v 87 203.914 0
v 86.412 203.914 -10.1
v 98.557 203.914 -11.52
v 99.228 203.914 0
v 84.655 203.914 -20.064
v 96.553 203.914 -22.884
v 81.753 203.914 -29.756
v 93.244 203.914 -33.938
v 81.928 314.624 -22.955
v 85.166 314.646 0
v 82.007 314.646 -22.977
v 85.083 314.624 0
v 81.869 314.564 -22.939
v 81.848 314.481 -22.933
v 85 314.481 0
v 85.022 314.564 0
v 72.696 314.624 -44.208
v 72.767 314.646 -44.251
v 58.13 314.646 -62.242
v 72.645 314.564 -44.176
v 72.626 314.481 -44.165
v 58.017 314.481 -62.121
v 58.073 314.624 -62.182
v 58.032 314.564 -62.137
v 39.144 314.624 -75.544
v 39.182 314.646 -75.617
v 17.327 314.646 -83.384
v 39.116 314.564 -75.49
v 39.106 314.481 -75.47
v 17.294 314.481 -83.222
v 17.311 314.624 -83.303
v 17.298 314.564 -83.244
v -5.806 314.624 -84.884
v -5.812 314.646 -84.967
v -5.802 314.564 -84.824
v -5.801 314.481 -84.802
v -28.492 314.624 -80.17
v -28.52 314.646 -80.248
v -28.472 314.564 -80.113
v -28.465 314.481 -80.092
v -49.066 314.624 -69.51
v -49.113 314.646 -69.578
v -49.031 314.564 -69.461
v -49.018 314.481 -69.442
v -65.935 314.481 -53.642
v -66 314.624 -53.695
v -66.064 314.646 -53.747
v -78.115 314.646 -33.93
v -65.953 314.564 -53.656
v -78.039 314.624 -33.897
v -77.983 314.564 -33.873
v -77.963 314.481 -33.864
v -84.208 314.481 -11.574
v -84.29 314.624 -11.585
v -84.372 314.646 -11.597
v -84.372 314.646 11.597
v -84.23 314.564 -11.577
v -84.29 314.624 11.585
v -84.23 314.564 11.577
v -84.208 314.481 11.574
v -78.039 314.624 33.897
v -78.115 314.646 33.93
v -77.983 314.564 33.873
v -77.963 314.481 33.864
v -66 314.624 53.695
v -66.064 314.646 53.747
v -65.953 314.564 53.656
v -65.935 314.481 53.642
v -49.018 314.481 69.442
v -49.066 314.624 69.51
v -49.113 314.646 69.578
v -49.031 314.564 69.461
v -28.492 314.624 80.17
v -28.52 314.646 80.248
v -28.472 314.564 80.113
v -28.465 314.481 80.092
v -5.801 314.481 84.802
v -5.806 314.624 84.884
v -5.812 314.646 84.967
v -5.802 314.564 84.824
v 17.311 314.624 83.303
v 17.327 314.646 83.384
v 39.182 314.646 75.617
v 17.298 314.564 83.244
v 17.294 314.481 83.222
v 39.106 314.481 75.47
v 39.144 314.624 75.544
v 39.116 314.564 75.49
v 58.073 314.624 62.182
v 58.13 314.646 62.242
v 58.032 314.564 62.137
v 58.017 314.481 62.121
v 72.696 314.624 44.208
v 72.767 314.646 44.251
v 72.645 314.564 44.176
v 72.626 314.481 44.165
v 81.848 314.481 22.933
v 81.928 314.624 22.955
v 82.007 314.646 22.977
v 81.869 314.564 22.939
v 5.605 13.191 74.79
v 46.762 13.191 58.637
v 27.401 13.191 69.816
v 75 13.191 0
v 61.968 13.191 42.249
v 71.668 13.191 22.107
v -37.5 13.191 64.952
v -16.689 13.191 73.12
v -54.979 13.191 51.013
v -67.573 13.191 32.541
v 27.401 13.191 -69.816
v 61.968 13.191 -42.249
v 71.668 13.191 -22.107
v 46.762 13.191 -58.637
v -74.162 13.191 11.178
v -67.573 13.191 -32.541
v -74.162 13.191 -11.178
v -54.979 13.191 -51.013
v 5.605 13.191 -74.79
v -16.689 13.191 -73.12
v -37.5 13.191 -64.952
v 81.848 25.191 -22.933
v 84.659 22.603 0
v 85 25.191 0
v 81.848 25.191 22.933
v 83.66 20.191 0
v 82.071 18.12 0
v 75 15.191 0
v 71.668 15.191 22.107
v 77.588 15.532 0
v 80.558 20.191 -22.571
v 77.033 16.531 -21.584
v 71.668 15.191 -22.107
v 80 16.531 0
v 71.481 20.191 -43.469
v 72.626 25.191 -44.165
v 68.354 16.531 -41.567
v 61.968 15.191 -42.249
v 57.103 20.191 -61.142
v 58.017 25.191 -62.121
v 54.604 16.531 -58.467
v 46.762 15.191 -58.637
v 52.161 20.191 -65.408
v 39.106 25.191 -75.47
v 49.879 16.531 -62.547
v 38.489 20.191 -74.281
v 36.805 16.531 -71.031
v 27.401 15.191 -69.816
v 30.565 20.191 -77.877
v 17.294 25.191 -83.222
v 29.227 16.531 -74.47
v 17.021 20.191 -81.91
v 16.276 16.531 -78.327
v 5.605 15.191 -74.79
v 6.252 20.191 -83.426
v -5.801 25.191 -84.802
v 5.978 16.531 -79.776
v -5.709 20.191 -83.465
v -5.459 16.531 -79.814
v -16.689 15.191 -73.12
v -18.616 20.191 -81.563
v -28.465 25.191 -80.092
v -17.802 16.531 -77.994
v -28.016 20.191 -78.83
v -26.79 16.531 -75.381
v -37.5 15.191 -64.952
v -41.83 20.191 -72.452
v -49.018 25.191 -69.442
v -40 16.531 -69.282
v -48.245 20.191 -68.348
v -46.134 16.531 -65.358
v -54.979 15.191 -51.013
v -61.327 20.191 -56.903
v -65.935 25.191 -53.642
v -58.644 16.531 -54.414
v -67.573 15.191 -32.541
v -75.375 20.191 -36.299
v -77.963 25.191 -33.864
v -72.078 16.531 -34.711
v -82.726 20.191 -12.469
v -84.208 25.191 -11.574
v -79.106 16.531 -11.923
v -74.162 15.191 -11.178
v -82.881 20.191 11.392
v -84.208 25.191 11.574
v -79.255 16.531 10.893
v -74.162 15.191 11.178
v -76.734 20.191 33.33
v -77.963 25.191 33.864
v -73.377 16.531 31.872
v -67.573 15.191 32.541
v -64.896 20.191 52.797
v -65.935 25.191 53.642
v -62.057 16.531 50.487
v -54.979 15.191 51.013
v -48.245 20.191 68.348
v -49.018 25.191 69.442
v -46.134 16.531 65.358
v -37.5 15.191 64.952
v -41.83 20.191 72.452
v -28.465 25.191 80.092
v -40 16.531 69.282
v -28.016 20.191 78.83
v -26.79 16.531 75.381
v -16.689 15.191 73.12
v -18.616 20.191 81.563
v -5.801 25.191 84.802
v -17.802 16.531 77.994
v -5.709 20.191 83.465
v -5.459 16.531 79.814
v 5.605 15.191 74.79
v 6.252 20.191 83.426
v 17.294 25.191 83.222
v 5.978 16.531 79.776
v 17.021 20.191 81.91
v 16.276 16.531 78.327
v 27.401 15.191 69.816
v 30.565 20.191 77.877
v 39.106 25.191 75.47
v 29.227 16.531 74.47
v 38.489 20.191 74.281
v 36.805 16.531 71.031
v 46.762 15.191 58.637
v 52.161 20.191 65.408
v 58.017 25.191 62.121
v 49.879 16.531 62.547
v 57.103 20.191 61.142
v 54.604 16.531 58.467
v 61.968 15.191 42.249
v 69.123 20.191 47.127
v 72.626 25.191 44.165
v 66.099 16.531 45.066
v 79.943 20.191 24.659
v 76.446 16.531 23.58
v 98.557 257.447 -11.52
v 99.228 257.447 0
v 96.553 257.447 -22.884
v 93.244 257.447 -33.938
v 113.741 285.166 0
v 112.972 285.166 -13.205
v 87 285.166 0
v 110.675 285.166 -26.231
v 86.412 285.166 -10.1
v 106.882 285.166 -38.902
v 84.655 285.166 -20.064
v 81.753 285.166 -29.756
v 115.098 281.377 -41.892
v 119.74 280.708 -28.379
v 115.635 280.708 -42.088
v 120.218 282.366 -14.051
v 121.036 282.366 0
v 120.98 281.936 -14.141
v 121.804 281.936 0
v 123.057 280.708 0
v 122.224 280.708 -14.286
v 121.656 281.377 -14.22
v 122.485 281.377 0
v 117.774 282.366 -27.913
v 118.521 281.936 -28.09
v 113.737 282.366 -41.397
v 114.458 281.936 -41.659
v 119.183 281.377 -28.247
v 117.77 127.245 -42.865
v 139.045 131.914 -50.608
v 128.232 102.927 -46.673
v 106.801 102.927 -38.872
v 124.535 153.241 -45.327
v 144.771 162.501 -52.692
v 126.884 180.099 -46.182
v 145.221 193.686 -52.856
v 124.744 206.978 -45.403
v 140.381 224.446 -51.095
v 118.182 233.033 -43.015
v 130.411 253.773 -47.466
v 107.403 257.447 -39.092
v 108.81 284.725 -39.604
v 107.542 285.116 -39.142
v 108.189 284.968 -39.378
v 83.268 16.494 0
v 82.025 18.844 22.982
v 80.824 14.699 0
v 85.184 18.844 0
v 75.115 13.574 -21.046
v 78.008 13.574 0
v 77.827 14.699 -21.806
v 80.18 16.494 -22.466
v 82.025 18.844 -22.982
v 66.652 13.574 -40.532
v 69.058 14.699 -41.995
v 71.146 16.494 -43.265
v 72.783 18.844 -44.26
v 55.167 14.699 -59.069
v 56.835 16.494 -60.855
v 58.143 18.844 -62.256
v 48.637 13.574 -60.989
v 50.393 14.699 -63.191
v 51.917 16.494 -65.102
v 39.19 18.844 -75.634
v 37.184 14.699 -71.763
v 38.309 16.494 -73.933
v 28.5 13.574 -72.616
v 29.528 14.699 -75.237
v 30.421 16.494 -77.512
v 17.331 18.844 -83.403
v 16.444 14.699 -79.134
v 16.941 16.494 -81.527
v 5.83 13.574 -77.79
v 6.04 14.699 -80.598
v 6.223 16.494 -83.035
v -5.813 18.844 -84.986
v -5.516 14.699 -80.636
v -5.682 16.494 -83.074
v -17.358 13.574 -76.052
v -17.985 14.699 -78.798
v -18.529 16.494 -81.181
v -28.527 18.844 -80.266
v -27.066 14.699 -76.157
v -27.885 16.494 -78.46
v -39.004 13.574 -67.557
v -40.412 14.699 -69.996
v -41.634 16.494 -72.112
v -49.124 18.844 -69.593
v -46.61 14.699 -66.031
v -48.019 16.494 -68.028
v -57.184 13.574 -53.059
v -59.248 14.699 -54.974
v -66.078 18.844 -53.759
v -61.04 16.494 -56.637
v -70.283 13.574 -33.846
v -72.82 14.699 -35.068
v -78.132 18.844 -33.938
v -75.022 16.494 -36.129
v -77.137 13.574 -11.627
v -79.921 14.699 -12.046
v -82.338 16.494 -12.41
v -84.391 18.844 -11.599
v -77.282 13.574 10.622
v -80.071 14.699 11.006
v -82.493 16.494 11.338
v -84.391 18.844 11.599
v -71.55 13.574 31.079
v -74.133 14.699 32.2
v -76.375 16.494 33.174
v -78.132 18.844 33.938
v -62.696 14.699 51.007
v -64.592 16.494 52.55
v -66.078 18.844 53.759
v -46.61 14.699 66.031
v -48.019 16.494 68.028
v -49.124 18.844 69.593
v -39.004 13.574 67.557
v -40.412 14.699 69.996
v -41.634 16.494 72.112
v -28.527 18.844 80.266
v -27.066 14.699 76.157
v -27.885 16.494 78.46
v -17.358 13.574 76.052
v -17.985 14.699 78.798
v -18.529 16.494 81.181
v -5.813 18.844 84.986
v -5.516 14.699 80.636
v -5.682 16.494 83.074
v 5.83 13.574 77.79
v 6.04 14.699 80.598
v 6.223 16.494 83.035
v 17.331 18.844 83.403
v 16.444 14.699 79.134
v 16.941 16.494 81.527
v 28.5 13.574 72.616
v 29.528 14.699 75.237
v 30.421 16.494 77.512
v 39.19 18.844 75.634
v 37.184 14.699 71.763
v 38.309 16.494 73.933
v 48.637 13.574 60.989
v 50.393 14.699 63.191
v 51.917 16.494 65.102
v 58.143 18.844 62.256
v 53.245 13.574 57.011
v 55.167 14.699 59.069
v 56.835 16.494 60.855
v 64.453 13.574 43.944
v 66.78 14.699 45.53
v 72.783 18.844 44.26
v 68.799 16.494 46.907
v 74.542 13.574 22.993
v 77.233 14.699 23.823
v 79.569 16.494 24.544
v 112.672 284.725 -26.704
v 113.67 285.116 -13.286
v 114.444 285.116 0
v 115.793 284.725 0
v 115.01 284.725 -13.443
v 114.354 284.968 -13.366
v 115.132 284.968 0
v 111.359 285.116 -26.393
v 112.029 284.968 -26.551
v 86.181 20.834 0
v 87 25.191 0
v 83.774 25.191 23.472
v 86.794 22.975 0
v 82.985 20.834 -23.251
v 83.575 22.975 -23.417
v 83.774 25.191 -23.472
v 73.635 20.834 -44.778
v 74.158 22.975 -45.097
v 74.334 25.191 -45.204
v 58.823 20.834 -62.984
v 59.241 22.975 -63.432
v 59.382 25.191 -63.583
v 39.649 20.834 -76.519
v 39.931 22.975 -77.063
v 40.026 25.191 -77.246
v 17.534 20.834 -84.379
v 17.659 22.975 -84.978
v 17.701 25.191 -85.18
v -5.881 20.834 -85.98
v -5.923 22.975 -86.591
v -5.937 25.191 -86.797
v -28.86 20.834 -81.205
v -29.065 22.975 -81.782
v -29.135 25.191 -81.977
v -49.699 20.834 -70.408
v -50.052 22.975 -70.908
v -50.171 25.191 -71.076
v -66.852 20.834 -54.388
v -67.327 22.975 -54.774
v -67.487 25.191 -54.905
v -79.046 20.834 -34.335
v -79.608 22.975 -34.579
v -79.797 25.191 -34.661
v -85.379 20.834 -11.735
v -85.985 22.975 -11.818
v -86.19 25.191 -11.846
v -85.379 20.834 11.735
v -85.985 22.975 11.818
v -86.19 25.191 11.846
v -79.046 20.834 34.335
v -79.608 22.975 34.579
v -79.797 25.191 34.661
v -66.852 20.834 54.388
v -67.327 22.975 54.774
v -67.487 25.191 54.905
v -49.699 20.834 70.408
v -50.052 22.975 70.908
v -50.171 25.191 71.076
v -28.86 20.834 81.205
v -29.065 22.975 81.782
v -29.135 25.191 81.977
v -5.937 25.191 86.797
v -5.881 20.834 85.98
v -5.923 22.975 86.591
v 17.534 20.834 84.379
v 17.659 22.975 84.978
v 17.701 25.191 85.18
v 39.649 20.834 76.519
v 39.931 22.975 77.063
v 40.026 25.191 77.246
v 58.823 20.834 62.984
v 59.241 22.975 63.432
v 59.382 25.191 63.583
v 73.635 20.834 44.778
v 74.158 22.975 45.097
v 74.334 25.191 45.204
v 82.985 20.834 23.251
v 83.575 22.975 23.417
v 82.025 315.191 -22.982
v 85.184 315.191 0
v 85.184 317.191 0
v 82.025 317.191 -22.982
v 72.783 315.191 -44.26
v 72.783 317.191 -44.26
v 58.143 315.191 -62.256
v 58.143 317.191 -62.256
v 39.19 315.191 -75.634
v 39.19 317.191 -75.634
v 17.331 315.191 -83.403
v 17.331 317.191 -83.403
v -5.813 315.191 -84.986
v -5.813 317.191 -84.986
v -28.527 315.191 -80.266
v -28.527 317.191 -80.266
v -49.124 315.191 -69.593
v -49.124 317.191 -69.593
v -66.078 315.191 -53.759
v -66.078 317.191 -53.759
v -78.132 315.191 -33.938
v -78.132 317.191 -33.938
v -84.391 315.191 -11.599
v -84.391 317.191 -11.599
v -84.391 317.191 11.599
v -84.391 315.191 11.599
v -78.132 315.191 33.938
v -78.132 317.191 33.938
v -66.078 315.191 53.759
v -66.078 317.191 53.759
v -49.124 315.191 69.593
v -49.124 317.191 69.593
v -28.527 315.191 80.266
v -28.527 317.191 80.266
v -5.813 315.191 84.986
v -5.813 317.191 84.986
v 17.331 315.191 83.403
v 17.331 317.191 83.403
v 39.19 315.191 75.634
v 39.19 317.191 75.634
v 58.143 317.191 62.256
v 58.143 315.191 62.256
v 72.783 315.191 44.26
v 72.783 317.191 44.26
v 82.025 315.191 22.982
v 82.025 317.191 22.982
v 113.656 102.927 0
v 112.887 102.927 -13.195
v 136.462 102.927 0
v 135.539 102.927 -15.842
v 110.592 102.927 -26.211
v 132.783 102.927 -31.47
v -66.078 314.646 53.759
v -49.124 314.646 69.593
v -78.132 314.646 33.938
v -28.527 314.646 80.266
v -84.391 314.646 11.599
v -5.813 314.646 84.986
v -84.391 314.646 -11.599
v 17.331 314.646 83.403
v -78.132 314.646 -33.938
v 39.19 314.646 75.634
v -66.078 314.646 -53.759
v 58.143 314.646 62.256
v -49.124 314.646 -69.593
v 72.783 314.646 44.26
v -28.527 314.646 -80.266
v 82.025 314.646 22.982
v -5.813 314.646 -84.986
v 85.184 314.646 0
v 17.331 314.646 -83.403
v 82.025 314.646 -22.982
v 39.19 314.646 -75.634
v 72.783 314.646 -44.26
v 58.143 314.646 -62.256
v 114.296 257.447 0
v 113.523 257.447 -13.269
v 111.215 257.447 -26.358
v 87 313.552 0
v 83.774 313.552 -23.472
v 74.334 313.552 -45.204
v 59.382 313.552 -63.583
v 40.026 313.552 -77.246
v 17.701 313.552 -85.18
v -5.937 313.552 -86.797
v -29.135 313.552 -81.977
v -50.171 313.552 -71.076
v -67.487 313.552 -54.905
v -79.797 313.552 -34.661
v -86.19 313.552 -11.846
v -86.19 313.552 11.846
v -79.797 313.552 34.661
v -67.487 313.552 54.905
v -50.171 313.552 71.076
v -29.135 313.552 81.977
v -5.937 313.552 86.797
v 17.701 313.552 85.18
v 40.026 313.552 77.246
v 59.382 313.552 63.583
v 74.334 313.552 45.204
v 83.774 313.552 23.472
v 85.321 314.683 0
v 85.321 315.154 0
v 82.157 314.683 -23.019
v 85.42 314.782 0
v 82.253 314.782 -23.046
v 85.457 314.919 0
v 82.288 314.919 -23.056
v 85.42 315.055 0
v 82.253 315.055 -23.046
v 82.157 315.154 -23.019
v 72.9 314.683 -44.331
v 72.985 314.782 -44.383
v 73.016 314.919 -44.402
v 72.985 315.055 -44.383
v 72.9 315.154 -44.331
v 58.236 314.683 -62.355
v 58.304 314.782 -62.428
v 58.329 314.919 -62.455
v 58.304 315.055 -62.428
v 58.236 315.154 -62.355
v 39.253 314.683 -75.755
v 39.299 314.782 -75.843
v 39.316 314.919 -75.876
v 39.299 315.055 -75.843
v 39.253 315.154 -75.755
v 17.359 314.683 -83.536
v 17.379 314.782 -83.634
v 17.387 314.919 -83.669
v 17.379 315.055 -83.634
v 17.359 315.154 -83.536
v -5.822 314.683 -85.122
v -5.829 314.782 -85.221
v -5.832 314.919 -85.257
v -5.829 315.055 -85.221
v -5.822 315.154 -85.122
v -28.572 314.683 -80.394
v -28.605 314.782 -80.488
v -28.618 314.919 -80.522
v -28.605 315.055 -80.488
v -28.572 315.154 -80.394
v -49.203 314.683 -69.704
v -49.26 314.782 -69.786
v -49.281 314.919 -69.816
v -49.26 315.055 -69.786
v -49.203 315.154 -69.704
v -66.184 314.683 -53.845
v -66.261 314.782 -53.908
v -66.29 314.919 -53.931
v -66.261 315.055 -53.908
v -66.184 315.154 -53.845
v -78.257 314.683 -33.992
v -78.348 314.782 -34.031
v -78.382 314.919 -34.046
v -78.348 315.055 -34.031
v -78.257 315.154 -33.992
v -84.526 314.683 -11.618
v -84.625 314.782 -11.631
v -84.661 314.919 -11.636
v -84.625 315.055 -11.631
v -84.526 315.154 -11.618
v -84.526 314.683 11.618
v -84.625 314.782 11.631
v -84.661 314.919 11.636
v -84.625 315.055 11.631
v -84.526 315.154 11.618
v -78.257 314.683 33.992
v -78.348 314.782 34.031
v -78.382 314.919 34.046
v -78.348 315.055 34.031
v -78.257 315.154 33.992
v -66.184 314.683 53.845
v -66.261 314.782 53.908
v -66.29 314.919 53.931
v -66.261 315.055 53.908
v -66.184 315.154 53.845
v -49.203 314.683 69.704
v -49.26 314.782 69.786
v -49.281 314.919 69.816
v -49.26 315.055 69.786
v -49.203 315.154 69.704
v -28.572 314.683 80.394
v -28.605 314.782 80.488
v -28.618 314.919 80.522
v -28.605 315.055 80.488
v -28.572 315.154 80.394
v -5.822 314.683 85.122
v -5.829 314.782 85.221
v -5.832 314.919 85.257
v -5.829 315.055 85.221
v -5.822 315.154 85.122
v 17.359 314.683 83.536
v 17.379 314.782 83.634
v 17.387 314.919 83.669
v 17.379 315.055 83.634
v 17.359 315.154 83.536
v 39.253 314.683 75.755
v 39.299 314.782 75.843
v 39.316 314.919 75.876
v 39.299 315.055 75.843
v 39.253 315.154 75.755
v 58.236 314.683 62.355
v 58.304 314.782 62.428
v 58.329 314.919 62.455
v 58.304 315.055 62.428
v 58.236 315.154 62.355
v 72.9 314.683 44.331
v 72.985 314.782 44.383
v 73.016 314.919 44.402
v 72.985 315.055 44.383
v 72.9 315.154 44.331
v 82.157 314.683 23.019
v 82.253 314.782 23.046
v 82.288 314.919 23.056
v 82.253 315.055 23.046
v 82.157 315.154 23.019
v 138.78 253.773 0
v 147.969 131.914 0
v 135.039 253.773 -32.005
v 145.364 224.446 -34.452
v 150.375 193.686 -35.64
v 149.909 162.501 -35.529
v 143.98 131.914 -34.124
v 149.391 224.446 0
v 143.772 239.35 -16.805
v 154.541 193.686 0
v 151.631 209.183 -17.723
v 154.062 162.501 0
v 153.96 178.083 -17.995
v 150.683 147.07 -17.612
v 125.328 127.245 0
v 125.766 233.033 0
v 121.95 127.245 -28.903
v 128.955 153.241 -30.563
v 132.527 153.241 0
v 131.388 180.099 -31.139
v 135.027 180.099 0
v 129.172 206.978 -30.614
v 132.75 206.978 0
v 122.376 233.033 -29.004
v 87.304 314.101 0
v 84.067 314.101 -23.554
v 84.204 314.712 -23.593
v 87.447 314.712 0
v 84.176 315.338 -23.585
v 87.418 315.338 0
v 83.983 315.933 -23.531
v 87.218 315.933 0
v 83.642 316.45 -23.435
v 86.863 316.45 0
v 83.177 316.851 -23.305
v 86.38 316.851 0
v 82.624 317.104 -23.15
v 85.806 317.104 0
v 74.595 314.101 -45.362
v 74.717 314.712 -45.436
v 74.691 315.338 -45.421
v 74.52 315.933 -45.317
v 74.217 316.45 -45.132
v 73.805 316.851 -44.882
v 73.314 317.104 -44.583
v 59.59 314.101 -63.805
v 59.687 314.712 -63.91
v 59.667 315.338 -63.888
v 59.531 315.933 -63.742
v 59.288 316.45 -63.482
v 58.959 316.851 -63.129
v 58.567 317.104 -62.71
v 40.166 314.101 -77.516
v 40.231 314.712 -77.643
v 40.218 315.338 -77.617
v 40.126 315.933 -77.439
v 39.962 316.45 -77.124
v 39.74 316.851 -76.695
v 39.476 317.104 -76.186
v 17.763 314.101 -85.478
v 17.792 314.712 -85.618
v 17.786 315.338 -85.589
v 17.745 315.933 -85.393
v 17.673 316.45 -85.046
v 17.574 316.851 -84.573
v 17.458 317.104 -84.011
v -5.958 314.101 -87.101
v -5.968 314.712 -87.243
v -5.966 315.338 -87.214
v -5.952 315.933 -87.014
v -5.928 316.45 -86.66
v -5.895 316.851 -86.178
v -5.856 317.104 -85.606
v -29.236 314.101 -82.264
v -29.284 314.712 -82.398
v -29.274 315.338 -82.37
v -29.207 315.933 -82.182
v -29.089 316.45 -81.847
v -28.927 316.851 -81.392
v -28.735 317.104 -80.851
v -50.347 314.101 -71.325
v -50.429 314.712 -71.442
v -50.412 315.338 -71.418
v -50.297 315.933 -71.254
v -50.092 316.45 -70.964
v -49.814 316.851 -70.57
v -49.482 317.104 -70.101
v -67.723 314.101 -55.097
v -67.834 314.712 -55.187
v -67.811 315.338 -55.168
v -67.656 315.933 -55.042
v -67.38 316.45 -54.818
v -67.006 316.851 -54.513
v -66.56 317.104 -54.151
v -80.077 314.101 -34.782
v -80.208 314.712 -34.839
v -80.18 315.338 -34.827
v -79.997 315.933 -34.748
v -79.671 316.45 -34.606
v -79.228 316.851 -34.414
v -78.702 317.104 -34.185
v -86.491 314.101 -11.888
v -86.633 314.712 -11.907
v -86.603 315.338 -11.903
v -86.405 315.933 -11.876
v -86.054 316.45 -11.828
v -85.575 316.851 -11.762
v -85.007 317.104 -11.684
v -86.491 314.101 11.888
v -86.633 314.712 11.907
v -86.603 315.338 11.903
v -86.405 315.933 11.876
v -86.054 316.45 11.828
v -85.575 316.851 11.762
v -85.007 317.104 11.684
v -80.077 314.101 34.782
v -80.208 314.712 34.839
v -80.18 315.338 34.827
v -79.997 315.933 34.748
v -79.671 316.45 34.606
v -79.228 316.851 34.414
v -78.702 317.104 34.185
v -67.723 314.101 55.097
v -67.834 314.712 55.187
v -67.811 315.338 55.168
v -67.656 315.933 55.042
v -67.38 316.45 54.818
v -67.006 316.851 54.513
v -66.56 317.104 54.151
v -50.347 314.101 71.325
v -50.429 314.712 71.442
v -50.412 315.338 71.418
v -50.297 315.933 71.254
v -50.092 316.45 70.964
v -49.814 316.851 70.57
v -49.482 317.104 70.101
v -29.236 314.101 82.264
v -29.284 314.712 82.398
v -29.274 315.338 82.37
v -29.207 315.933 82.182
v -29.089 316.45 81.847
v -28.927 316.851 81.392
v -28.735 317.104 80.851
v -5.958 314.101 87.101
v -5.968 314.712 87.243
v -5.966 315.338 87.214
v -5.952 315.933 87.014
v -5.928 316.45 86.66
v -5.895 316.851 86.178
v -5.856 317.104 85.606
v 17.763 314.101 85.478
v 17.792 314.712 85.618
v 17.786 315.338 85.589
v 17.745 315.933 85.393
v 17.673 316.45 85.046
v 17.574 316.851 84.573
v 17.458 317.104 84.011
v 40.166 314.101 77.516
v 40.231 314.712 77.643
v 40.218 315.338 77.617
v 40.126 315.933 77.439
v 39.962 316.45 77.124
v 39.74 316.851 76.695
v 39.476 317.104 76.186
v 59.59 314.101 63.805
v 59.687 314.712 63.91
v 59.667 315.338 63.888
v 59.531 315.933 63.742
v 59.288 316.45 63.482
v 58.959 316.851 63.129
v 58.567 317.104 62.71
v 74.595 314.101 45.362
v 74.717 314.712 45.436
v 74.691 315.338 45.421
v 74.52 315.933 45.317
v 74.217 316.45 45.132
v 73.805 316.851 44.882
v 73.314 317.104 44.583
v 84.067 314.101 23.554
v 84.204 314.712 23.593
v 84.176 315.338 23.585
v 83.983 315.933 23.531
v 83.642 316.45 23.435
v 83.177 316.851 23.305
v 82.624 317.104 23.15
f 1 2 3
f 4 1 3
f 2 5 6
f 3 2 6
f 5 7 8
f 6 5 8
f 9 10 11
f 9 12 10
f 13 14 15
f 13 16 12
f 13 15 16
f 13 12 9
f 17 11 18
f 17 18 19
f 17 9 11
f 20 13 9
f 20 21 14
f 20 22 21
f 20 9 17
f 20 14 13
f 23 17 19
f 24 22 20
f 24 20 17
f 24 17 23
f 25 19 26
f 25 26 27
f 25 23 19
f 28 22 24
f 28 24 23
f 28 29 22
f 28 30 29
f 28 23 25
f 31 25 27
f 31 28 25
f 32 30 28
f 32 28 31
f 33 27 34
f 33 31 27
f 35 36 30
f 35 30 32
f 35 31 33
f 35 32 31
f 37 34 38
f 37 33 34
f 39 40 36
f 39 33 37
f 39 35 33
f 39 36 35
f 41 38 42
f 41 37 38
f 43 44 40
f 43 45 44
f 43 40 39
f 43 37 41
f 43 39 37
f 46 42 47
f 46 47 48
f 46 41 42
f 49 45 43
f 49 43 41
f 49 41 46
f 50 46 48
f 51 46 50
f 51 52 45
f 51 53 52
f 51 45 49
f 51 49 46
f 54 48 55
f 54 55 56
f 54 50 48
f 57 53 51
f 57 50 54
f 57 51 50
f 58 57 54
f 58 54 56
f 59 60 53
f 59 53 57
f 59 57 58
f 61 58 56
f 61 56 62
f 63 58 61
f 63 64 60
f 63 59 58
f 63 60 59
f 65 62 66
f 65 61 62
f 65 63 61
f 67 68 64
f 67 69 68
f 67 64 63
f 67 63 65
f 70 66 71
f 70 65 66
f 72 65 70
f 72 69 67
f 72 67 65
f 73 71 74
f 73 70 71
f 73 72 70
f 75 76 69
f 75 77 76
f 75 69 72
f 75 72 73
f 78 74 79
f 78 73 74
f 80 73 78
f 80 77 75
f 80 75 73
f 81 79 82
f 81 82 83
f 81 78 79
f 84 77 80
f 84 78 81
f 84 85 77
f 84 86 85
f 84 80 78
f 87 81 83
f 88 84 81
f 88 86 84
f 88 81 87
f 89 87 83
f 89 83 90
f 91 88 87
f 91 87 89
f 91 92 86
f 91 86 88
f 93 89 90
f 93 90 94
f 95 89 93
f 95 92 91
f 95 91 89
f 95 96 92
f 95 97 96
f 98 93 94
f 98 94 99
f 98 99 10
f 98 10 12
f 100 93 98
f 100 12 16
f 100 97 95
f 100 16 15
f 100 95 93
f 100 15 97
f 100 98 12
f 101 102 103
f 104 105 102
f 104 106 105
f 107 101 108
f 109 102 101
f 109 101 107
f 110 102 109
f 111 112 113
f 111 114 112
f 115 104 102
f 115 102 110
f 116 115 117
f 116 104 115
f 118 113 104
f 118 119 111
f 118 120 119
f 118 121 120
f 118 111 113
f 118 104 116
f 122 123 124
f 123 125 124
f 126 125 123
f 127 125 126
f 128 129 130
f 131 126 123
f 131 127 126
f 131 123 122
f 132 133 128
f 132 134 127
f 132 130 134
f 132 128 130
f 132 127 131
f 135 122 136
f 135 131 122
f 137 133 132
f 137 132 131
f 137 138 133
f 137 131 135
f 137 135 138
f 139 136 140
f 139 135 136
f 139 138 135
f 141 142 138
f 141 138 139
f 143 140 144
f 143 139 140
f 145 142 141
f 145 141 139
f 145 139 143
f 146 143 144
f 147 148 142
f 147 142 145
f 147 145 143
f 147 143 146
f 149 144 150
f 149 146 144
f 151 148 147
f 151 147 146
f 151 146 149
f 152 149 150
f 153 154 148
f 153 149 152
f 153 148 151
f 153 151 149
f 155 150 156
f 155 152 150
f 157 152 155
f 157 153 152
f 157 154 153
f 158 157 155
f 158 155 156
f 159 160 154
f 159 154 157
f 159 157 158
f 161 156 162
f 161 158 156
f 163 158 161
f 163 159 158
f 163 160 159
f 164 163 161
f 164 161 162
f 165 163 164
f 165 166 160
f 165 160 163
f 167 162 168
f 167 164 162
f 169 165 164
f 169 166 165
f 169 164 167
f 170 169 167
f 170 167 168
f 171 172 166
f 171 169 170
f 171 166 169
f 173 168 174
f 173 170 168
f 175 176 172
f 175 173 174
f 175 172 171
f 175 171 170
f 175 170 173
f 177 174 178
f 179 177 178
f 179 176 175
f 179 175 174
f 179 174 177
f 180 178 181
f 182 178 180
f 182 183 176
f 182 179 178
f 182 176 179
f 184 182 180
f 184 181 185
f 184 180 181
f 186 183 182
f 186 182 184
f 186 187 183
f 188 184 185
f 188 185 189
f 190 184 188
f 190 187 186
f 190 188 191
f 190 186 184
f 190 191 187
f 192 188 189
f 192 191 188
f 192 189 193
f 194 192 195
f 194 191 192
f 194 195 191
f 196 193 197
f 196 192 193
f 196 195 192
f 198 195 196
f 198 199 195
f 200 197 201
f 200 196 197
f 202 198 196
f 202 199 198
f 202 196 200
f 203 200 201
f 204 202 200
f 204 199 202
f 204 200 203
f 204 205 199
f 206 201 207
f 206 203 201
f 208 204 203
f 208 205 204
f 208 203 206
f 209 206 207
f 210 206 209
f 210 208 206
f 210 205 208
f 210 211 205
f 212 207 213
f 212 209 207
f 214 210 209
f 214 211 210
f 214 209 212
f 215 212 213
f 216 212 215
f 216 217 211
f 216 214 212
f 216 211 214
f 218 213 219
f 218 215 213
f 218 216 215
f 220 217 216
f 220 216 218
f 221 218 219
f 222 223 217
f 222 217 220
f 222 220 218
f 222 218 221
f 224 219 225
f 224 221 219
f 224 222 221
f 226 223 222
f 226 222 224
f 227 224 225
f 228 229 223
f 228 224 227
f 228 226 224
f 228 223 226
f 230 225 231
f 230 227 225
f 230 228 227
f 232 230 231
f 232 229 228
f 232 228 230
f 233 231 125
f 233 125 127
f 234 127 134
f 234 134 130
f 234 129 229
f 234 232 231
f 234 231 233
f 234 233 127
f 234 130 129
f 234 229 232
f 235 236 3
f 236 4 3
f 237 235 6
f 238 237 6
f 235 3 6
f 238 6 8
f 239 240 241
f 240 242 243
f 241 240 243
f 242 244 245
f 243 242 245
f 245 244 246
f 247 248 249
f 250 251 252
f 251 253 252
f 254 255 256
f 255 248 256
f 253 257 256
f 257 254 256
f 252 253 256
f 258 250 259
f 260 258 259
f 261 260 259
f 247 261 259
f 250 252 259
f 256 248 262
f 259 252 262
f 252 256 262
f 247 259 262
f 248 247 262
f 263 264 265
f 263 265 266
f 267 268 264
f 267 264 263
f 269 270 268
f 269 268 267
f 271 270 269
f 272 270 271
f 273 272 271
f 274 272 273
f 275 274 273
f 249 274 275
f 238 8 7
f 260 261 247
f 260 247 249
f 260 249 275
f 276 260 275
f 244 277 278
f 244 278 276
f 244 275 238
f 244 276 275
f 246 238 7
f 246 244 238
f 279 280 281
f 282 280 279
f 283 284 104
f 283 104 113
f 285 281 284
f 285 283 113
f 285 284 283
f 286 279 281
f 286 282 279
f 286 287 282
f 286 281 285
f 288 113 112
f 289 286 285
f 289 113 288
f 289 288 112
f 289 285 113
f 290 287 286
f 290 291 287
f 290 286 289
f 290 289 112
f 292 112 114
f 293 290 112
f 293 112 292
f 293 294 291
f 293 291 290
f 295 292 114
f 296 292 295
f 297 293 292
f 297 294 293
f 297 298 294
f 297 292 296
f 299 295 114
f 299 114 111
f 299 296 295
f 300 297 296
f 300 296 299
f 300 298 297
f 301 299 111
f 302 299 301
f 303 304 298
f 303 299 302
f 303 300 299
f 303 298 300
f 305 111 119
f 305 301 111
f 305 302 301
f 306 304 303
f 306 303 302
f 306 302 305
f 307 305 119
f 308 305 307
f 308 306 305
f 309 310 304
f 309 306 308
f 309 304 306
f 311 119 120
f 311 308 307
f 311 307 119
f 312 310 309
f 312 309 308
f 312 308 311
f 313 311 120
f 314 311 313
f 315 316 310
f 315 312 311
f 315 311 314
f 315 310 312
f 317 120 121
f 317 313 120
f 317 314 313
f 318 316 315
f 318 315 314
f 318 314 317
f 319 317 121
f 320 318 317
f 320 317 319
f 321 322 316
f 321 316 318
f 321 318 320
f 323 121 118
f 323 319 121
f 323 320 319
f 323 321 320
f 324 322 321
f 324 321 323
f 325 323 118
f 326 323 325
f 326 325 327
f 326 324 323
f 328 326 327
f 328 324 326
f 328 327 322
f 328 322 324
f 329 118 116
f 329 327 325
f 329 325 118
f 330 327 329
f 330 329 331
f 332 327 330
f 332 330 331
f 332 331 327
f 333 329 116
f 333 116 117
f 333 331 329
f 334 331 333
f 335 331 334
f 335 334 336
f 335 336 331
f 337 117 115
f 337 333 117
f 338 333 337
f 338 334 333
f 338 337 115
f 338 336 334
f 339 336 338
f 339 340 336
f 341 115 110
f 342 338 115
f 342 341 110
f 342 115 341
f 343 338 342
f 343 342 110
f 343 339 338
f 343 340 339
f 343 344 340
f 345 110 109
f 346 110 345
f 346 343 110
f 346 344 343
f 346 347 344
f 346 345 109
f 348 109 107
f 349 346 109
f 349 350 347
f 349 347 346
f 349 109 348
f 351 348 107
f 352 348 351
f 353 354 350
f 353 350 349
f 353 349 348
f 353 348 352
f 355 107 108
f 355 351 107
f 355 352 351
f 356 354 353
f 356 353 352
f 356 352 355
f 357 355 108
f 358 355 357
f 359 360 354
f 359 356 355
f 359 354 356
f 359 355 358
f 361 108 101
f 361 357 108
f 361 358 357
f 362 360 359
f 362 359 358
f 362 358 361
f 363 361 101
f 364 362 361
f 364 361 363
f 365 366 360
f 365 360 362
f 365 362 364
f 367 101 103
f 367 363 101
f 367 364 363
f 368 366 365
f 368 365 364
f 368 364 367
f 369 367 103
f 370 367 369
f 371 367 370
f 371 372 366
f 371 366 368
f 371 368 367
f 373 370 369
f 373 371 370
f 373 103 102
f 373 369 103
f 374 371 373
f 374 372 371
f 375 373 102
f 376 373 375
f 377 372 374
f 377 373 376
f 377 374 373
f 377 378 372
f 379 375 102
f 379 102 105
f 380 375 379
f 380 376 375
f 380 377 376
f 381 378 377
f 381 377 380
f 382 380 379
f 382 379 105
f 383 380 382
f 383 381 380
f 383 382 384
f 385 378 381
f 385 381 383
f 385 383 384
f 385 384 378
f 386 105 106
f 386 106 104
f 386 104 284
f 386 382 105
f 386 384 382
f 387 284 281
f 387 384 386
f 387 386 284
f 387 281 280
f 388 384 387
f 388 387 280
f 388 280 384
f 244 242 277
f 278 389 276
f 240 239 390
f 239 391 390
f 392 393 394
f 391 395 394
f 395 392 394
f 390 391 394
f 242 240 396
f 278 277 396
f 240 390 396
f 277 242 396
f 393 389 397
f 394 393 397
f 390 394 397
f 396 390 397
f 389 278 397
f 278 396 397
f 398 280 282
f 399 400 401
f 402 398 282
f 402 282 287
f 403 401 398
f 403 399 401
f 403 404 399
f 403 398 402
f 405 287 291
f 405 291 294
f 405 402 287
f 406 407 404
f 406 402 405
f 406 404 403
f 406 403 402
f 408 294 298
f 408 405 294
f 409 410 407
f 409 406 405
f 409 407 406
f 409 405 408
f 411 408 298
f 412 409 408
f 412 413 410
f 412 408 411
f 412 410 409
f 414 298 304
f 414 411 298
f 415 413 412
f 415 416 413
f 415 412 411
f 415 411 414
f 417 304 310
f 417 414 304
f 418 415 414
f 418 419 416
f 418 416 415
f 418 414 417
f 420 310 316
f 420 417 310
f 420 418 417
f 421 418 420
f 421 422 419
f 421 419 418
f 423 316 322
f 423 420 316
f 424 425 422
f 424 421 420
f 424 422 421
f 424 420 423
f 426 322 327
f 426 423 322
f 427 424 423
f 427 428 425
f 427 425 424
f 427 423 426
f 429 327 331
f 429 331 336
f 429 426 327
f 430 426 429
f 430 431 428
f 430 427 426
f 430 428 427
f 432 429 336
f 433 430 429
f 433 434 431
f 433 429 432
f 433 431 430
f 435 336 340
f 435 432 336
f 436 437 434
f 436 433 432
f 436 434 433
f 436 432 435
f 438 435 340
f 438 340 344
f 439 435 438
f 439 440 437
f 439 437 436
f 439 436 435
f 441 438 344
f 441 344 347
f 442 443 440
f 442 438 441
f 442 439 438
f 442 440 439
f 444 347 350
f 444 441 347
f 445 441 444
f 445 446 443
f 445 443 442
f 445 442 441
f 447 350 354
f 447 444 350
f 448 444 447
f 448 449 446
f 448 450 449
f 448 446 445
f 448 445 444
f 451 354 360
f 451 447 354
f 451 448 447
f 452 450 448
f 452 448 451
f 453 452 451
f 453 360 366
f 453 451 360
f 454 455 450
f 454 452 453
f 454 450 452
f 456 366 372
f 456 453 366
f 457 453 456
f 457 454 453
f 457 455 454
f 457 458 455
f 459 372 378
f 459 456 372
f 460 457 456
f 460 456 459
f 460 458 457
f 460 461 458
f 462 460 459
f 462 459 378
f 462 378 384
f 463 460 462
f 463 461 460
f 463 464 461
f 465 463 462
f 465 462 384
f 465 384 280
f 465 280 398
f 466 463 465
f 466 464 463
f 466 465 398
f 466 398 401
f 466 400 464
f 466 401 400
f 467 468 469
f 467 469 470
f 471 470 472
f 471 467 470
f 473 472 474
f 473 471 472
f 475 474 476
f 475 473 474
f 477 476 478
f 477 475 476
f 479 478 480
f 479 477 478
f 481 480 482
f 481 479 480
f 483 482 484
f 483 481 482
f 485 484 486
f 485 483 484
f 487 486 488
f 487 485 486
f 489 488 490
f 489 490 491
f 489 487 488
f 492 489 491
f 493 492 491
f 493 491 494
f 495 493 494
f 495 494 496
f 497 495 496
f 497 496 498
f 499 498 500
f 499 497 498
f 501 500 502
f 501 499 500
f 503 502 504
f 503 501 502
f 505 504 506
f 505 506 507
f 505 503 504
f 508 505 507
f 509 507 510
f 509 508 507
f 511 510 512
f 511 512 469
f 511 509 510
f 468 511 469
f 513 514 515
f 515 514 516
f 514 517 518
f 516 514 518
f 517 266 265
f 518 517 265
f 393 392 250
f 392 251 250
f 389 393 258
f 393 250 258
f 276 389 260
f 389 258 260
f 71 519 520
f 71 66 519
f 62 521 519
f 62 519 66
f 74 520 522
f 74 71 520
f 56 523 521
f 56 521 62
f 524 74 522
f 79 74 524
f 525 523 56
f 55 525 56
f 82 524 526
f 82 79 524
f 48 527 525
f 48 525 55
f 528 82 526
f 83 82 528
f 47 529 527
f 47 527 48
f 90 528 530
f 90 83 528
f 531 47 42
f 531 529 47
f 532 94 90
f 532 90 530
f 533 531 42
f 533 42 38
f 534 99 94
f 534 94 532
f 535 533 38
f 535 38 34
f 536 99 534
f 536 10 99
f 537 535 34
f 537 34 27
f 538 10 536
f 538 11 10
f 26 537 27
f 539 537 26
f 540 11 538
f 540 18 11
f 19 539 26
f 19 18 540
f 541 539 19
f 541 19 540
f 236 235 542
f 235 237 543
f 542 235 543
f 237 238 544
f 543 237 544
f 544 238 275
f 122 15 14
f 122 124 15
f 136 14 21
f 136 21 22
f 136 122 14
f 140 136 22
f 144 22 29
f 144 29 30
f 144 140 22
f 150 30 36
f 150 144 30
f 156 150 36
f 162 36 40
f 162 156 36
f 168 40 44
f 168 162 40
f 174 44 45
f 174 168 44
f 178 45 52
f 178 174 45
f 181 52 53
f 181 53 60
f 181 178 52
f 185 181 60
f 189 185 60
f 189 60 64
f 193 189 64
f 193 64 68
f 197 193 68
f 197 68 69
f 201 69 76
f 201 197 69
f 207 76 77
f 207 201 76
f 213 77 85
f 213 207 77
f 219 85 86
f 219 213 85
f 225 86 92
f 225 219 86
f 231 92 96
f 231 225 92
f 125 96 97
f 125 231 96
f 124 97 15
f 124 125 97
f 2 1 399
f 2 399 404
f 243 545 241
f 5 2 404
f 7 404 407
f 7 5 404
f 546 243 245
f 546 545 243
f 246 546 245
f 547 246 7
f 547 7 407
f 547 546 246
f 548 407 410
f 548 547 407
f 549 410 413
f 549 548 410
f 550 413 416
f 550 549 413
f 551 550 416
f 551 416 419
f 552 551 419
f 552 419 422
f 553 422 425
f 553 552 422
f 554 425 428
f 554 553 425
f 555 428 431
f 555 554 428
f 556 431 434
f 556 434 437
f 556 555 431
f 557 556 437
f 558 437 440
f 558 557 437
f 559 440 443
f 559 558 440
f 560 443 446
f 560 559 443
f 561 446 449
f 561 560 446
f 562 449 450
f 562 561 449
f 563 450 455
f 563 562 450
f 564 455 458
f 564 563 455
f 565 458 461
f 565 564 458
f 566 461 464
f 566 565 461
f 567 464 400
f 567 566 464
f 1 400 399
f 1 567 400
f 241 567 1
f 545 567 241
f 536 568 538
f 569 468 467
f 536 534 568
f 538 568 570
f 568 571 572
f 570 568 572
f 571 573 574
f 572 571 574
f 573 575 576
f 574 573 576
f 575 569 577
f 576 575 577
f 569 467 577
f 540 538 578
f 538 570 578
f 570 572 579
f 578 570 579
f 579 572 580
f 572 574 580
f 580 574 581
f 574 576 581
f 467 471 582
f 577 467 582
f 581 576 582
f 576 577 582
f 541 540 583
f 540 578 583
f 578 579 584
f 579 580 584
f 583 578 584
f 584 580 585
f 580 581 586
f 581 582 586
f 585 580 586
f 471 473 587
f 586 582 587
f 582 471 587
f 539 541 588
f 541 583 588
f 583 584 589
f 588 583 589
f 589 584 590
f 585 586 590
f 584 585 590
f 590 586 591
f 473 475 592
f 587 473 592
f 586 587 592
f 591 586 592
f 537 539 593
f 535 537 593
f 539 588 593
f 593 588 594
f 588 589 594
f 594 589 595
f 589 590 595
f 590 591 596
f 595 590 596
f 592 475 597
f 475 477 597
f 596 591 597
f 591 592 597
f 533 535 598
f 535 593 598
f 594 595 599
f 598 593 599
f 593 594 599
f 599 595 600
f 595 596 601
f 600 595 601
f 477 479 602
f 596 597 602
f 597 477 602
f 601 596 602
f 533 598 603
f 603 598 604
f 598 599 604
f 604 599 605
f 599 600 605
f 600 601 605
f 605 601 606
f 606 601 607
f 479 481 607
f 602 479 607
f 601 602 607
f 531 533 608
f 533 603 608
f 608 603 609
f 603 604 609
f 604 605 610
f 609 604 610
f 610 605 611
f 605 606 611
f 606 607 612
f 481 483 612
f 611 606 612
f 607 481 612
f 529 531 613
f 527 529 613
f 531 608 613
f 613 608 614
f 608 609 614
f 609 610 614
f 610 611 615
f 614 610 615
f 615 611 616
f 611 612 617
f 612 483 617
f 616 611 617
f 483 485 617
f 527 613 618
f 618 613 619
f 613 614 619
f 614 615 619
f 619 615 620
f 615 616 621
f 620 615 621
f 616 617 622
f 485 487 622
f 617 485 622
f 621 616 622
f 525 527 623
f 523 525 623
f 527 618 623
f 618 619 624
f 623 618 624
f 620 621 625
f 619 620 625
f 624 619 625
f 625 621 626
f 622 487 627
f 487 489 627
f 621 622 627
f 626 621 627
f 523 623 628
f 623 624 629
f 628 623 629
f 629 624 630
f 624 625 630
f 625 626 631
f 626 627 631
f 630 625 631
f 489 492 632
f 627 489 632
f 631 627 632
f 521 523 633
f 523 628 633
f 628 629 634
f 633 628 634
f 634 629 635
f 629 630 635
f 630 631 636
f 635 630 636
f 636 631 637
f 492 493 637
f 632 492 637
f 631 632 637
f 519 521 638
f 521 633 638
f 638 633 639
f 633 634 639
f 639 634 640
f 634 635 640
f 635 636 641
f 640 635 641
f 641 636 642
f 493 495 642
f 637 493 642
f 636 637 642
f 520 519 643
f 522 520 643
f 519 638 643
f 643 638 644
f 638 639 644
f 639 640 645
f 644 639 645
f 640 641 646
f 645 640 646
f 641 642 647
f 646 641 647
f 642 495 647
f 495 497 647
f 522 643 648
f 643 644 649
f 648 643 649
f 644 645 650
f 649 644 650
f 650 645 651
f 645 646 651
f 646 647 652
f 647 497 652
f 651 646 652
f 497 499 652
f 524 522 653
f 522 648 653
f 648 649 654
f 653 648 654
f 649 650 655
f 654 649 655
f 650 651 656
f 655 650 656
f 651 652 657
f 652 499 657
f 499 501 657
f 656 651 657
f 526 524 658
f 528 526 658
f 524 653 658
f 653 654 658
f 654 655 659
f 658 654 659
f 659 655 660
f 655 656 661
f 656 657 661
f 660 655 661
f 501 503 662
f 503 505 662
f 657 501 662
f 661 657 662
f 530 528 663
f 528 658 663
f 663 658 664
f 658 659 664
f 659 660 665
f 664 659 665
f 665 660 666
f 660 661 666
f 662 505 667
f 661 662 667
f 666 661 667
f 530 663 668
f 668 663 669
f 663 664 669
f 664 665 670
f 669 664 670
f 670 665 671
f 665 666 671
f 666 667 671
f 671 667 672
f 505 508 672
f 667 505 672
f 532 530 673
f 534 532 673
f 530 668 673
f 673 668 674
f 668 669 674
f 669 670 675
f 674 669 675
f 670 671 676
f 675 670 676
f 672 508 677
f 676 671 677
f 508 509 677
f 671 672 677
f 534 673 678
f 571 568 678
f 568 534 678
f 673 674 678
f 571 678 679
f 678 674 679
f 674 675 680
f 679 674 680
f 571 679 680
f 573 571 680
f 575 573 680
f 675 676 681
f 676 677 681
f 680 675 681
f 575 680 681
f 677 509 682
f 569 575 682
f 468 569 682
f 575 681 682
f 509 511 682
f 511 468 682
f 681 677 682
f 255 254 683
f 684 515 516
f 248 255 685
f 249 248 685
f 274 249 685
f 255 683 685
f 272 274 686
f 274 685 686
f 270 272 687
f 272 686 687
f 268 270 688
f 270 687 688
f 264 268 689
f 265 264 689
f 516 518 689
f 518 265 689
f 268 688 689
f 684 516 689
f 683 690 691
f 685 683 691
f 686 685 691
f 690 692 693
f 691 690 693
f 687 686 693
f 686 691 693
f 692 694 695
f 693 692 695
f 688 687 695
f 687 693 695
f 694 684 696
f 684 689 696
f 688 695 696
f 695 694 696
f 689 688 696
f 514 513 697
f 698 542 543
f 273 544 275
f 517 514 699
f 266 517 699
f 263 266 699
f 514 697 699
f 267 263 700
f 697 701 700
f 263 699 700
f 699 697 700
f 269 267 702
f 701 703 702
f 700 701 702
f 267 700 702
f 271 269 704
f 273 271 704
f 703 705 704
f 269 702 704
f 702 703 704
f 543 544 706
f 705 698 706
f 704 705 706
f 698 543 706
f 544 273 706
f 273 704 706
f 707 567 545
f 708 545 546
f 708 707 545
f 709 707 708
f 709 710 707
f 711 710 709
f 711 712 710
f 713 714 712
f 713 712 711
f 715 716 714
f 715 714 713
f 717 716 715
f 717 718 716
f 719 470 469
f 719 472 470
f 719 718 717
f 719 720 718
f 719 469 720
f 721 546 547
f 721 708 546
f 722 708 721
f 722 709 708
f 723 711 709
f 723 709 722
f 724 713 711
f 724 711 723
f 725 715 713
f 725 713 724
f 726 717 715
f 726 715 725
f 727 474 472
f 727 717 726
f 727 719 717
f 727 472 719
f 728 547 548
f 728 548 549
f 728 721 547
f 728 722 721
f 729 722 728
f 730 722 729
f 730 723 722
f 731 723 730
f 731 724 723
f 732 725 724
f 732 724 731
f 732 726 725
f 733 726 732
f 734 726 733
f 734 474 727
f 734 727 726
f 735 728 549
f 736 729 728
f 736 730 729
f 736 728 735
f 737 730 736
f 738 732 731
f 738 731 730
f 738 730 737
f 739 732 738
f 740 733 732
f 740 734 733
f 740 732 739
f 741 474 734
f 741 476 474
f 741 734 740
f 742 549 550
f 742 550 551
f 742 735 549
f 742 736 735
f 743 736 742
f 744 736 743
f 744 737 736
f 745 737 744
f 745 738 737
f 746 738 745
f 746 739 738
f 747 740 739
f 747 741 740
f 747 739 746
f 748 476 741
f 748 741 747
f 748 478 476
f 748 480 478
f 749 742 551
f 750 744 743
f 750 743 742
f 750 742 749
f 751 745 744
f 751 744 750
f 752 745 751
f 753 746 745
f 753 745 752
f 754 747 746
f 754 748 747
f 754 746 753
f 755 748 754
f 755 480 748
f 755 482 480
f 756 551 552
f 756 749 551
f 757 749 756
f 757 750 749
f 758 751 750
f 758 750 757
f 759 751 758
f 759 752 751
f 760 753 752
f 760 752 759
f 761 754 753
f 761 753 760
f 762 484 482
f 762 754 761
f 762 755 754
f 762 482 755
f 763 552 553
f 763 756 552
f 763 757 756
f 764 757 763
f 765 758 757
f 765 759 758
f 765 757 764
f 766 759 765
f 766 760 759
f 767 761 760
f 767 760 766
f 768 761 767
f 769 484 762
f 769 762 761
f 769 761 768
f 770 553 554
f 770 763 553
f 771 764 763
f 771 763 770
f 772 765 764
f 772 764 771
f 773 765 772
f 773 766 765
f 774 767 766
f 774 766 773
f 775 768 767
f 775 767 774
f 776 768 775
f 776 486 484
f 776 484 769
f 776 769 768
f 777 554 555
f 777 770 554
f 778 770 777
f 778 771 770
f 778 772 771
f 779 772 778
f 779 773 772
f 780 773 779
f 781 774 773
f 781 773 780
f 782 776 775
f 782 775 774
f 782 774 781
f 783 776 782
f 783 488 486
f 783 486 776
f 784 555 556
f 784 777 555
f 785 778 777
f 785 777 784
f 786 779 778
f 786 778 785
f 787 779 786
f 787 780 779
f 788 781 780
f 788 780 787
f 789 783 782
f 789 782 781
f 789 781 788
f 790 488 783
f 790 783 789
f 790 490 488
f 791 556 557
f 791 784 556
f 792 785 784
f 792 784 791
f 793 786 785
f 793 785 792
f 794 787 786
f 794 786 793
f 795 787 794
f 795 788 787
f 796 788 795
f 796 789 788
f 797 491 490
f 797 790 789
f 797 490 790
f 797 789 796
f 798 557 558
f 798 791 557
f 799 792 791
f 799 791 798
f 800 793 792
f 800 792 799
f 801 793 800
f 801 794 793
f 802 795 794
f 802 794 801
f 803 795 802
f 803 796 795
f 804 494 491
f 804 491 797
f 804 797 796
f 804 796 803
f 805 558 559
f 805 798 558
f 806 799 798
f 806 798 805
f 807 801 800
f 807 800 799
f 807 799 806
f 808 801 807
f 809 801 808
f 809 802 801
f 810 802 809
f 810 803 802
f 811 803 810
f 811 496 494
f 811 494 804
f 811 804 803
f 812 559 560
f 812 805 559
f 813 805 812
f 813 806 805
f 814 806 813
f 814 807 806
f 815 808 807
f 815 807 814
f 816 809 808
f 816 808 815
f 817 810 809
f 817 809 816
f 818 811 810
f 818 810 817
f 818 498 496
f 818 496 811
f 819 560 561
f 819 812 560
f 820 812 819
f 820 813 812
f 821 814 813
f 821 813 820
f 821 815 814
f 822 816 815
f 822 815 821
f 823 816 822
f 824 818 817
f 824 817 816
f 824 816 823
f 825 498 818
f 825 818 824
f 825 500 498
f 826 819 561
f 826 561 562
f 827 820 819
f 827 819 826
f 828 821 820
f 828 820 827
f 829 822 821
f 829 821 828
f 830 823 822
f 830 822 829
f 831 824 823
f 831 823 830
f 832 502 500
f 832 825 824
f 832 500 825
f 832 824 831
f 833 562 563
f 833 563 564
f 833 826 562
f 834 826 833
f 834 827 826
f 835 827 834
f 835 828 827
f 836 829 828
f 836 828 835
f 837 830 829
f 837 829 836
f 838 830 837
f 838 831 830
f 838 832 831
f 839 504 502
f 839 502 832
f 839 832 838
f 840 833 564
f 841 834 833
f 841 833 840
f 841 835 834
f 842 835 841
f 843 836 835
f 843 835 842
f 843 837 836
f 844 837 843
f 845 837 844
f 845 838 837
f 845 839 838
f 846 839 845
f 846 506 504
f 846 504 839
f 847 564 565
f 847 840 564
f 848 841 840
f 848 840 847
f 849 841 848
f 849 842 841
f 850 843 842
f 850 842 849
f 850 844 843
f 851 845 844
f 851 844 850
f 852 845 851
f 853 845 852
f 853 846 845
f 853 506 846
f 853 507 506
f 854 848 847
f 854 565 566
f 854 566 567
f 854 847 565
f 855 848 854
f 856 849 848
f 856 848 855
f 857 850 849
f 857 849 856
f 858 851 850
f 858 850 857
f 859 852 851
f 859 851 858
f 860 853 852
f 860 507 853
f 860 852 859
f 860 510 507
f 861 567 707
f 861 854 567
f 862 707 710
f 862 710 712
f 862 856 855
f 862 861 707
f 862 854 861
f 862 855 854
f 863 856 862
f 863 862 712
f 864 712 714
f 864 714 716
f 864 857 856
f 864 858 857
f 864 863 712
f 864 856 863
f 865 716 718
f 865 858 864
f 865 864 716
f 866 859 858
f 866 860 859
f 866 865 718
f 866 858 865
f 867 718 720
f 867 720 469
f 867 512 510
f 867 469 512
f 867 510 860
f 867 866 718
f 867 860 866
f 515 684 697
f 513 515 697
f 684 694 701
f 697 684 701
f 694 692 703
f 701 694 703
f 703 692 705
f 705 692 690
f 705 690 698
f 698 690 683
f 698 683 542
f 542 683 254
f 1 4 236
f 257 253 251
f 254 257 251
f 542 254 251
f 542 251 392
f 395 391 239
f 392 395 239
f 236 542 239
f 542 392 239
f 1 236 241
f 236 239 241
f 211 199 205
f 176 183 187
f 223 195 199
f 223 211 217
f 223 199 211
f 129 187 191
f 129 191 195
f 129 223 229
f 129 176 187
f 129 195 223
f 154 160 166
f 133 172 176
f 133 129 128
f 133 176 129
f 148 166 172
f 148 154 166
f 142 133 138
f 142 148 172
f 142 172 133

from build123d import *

# Parameters (mm, degrees)
REVOLVE2_ANGLE = 20


with BuildPart() as part:
    # Sketch1 → Revolve1 (revolve)
    with BuildSketch(Plane.XY, mode=Mode.PRIVATE) as revolve1_sk:
        with BuildLine():
            Line((0, 15.190892732), (-75, 15.190892732))
            ThreePointArc((-75, 15.190892732), (-82.071067812, 18.11982492), (-85, 25.190892732))
            Line((-85, 25.190892732), (-85, 314.480751979))
            ThreePointArc((-85, 314.480751979), (-85.048474494, 314.597779759), (-85.165502274, 314.646254252))
            Line((-85.165502274, 314.646254252), (-85.184354085, 314.646254252))
            ThreePointArc((-85.184354085, 314.646254252), (-85.456673325, 314.918573492), (-85.184354085, 315.190892732))
            Line((-85.184354085, 315.190892732), (0, 315.190892732))
            Line((0, 315.190892732), (0, 15.190892732))
        make_face()
    revolve(revolve1_sk.sketch.rotate(Axis((0, 15.190892732, 0), (0, 1, 0)), 270), axis=Axis((0, 15.190892732, 0), (0, 1, 0)))

    # Shell7: read off the stored shape, not the designer's step
    # Shell7 outline → Shell7 (revolve, cut)
    with BuildSketch(Plane.XY):
        with BuildLine():
            Line((85.184354085, 18.844324221), (85.184354085, 315.190892732))
            Line((85.184354085, 315.190892732), (0, 315.190892732))
            Line((0, 315.190892732), (0, 13.190892732))
            Line((0, 13.190892732), (75, 13.190892732))
            ThreePointArc((75, 13.190892732), (80.824138471, 14.699019159), (85.184354085, 18.844324221))
        make_face()
    revolve(axis=Axis((0, 0, 0), (0, 1, 0)), mode=Mode.SUBTRACT)

    # Shell7 2 outline → Shell7 2 (revolve)
    with BuildSketch(Plane.XY):
        with BuildLine():
            Line((85.184354085, 317.190892732), (85.184354085, 18.844324221))
            ThreePointArc((85.184354085, 18.844324221), (86.537162758, 21.890305589), (87, 25.190892732))
            Line((87, 25.190892732), (87, 313.552240941))
            ThreePointArc((87, 313.552240941), (87.21760007, 315.933140145), (85.184354085, 317.190892732))
        make_face()
    revolve(axis=Axis((0, 0, 0), (0, 1, 0)))

    # Shell7 3 outline → Shell7 3 (revolve, cut)
    with BuildSketch(Plane.XY):
        with BuildLine():
            Line((85.184354085, 315.190892732), (85.184354085, 314.646254252))
            ThreePointArc((85.184354085, 314.646254252), (85.456673325, 314.918573492), (85.184354085, 315.190892732))
        make_face()
    revolve(axis=Axis((0, 0, 0), (0, 1, 0)), mode=Mode.SUBTRACT)

    # Shell7 4 outline → Shell7 4 (revolve)
    with BuildSketch(Plane.XY):
        with BuildLine():
            Line((85.184354085, 18.844324221), (85.184354085, 314.646254252))
            Line((85.184354085, 314.646254252), (85.165502274, 314.646254252))
            ThreePointArc((85.165502274, 314.646254252), (85.048474494, 314.597779759), (85, 314.480751979))
            Line((85, 314.480751979), (85, 25.190892732))
            ThreePointArc((85, 25.190892732), (82.071067812, 18.11982492), (75, 15.190892732))
            Line((75, 15.190892732), (0, 15.190892732))
            Line((0, 15.190892732), (0, 13.190892732))
            Line((0, 13.190892732), (75, 13.190892732))
            ThreePointArc((75, 13.190892732), (80.824138471, 14.699019159), (85.184354085, 18.844324221))
        make_face()
    revolve(axis=Axis((0, 0, 0), (0, 1, 0)))

    # Sketch4 → Revolve2 (revolve)
    with BuildSketch(Plane.XY):
        with BuildLine():
            Line((87, 285.165847721), (113.741198075, 285.165847721))
            ThreePointArc((113.741198075, 285.165847721), (114.79047458, 285.054509994), (115.793021461, 284.725455247))
            Line((115.793021461, 284.725455247), (121.036139762, 282.366052012))
            ThreePointArc((121.036139762, 282.366052012), (122.156610921, 281.671227445), (123.056514115, 280.707686559))
            ThreePointArc((123.056514115, 280.707686559), (154.540912997, 193.685812088), (136.46168064, 102.926705841))
            Line((136.46168064, 102.926705841), (113.655526061, 102.926705841))
            ThreePointArc((113.655526061, 102.926705841), (135.027338912, 180.099482709), (114.295923717, 257.446753496))
            Line((114.295923717, 257.446753496), (99.227934217, 257.446753496))
            Line((99.227934217, 257.446753496), (99.227934217, 203.913989012))
            Line((99.227934217, 203.913989012), (87, 203.913989012))
            Line((87, 203.913989012), (87, 285.165847721))
        make_face()
    revolve(axis=Axis((0, 0, 0), (0, 1, 0)), revolution_arc=REVOLVE2_ANGLE)


solid = part.part
